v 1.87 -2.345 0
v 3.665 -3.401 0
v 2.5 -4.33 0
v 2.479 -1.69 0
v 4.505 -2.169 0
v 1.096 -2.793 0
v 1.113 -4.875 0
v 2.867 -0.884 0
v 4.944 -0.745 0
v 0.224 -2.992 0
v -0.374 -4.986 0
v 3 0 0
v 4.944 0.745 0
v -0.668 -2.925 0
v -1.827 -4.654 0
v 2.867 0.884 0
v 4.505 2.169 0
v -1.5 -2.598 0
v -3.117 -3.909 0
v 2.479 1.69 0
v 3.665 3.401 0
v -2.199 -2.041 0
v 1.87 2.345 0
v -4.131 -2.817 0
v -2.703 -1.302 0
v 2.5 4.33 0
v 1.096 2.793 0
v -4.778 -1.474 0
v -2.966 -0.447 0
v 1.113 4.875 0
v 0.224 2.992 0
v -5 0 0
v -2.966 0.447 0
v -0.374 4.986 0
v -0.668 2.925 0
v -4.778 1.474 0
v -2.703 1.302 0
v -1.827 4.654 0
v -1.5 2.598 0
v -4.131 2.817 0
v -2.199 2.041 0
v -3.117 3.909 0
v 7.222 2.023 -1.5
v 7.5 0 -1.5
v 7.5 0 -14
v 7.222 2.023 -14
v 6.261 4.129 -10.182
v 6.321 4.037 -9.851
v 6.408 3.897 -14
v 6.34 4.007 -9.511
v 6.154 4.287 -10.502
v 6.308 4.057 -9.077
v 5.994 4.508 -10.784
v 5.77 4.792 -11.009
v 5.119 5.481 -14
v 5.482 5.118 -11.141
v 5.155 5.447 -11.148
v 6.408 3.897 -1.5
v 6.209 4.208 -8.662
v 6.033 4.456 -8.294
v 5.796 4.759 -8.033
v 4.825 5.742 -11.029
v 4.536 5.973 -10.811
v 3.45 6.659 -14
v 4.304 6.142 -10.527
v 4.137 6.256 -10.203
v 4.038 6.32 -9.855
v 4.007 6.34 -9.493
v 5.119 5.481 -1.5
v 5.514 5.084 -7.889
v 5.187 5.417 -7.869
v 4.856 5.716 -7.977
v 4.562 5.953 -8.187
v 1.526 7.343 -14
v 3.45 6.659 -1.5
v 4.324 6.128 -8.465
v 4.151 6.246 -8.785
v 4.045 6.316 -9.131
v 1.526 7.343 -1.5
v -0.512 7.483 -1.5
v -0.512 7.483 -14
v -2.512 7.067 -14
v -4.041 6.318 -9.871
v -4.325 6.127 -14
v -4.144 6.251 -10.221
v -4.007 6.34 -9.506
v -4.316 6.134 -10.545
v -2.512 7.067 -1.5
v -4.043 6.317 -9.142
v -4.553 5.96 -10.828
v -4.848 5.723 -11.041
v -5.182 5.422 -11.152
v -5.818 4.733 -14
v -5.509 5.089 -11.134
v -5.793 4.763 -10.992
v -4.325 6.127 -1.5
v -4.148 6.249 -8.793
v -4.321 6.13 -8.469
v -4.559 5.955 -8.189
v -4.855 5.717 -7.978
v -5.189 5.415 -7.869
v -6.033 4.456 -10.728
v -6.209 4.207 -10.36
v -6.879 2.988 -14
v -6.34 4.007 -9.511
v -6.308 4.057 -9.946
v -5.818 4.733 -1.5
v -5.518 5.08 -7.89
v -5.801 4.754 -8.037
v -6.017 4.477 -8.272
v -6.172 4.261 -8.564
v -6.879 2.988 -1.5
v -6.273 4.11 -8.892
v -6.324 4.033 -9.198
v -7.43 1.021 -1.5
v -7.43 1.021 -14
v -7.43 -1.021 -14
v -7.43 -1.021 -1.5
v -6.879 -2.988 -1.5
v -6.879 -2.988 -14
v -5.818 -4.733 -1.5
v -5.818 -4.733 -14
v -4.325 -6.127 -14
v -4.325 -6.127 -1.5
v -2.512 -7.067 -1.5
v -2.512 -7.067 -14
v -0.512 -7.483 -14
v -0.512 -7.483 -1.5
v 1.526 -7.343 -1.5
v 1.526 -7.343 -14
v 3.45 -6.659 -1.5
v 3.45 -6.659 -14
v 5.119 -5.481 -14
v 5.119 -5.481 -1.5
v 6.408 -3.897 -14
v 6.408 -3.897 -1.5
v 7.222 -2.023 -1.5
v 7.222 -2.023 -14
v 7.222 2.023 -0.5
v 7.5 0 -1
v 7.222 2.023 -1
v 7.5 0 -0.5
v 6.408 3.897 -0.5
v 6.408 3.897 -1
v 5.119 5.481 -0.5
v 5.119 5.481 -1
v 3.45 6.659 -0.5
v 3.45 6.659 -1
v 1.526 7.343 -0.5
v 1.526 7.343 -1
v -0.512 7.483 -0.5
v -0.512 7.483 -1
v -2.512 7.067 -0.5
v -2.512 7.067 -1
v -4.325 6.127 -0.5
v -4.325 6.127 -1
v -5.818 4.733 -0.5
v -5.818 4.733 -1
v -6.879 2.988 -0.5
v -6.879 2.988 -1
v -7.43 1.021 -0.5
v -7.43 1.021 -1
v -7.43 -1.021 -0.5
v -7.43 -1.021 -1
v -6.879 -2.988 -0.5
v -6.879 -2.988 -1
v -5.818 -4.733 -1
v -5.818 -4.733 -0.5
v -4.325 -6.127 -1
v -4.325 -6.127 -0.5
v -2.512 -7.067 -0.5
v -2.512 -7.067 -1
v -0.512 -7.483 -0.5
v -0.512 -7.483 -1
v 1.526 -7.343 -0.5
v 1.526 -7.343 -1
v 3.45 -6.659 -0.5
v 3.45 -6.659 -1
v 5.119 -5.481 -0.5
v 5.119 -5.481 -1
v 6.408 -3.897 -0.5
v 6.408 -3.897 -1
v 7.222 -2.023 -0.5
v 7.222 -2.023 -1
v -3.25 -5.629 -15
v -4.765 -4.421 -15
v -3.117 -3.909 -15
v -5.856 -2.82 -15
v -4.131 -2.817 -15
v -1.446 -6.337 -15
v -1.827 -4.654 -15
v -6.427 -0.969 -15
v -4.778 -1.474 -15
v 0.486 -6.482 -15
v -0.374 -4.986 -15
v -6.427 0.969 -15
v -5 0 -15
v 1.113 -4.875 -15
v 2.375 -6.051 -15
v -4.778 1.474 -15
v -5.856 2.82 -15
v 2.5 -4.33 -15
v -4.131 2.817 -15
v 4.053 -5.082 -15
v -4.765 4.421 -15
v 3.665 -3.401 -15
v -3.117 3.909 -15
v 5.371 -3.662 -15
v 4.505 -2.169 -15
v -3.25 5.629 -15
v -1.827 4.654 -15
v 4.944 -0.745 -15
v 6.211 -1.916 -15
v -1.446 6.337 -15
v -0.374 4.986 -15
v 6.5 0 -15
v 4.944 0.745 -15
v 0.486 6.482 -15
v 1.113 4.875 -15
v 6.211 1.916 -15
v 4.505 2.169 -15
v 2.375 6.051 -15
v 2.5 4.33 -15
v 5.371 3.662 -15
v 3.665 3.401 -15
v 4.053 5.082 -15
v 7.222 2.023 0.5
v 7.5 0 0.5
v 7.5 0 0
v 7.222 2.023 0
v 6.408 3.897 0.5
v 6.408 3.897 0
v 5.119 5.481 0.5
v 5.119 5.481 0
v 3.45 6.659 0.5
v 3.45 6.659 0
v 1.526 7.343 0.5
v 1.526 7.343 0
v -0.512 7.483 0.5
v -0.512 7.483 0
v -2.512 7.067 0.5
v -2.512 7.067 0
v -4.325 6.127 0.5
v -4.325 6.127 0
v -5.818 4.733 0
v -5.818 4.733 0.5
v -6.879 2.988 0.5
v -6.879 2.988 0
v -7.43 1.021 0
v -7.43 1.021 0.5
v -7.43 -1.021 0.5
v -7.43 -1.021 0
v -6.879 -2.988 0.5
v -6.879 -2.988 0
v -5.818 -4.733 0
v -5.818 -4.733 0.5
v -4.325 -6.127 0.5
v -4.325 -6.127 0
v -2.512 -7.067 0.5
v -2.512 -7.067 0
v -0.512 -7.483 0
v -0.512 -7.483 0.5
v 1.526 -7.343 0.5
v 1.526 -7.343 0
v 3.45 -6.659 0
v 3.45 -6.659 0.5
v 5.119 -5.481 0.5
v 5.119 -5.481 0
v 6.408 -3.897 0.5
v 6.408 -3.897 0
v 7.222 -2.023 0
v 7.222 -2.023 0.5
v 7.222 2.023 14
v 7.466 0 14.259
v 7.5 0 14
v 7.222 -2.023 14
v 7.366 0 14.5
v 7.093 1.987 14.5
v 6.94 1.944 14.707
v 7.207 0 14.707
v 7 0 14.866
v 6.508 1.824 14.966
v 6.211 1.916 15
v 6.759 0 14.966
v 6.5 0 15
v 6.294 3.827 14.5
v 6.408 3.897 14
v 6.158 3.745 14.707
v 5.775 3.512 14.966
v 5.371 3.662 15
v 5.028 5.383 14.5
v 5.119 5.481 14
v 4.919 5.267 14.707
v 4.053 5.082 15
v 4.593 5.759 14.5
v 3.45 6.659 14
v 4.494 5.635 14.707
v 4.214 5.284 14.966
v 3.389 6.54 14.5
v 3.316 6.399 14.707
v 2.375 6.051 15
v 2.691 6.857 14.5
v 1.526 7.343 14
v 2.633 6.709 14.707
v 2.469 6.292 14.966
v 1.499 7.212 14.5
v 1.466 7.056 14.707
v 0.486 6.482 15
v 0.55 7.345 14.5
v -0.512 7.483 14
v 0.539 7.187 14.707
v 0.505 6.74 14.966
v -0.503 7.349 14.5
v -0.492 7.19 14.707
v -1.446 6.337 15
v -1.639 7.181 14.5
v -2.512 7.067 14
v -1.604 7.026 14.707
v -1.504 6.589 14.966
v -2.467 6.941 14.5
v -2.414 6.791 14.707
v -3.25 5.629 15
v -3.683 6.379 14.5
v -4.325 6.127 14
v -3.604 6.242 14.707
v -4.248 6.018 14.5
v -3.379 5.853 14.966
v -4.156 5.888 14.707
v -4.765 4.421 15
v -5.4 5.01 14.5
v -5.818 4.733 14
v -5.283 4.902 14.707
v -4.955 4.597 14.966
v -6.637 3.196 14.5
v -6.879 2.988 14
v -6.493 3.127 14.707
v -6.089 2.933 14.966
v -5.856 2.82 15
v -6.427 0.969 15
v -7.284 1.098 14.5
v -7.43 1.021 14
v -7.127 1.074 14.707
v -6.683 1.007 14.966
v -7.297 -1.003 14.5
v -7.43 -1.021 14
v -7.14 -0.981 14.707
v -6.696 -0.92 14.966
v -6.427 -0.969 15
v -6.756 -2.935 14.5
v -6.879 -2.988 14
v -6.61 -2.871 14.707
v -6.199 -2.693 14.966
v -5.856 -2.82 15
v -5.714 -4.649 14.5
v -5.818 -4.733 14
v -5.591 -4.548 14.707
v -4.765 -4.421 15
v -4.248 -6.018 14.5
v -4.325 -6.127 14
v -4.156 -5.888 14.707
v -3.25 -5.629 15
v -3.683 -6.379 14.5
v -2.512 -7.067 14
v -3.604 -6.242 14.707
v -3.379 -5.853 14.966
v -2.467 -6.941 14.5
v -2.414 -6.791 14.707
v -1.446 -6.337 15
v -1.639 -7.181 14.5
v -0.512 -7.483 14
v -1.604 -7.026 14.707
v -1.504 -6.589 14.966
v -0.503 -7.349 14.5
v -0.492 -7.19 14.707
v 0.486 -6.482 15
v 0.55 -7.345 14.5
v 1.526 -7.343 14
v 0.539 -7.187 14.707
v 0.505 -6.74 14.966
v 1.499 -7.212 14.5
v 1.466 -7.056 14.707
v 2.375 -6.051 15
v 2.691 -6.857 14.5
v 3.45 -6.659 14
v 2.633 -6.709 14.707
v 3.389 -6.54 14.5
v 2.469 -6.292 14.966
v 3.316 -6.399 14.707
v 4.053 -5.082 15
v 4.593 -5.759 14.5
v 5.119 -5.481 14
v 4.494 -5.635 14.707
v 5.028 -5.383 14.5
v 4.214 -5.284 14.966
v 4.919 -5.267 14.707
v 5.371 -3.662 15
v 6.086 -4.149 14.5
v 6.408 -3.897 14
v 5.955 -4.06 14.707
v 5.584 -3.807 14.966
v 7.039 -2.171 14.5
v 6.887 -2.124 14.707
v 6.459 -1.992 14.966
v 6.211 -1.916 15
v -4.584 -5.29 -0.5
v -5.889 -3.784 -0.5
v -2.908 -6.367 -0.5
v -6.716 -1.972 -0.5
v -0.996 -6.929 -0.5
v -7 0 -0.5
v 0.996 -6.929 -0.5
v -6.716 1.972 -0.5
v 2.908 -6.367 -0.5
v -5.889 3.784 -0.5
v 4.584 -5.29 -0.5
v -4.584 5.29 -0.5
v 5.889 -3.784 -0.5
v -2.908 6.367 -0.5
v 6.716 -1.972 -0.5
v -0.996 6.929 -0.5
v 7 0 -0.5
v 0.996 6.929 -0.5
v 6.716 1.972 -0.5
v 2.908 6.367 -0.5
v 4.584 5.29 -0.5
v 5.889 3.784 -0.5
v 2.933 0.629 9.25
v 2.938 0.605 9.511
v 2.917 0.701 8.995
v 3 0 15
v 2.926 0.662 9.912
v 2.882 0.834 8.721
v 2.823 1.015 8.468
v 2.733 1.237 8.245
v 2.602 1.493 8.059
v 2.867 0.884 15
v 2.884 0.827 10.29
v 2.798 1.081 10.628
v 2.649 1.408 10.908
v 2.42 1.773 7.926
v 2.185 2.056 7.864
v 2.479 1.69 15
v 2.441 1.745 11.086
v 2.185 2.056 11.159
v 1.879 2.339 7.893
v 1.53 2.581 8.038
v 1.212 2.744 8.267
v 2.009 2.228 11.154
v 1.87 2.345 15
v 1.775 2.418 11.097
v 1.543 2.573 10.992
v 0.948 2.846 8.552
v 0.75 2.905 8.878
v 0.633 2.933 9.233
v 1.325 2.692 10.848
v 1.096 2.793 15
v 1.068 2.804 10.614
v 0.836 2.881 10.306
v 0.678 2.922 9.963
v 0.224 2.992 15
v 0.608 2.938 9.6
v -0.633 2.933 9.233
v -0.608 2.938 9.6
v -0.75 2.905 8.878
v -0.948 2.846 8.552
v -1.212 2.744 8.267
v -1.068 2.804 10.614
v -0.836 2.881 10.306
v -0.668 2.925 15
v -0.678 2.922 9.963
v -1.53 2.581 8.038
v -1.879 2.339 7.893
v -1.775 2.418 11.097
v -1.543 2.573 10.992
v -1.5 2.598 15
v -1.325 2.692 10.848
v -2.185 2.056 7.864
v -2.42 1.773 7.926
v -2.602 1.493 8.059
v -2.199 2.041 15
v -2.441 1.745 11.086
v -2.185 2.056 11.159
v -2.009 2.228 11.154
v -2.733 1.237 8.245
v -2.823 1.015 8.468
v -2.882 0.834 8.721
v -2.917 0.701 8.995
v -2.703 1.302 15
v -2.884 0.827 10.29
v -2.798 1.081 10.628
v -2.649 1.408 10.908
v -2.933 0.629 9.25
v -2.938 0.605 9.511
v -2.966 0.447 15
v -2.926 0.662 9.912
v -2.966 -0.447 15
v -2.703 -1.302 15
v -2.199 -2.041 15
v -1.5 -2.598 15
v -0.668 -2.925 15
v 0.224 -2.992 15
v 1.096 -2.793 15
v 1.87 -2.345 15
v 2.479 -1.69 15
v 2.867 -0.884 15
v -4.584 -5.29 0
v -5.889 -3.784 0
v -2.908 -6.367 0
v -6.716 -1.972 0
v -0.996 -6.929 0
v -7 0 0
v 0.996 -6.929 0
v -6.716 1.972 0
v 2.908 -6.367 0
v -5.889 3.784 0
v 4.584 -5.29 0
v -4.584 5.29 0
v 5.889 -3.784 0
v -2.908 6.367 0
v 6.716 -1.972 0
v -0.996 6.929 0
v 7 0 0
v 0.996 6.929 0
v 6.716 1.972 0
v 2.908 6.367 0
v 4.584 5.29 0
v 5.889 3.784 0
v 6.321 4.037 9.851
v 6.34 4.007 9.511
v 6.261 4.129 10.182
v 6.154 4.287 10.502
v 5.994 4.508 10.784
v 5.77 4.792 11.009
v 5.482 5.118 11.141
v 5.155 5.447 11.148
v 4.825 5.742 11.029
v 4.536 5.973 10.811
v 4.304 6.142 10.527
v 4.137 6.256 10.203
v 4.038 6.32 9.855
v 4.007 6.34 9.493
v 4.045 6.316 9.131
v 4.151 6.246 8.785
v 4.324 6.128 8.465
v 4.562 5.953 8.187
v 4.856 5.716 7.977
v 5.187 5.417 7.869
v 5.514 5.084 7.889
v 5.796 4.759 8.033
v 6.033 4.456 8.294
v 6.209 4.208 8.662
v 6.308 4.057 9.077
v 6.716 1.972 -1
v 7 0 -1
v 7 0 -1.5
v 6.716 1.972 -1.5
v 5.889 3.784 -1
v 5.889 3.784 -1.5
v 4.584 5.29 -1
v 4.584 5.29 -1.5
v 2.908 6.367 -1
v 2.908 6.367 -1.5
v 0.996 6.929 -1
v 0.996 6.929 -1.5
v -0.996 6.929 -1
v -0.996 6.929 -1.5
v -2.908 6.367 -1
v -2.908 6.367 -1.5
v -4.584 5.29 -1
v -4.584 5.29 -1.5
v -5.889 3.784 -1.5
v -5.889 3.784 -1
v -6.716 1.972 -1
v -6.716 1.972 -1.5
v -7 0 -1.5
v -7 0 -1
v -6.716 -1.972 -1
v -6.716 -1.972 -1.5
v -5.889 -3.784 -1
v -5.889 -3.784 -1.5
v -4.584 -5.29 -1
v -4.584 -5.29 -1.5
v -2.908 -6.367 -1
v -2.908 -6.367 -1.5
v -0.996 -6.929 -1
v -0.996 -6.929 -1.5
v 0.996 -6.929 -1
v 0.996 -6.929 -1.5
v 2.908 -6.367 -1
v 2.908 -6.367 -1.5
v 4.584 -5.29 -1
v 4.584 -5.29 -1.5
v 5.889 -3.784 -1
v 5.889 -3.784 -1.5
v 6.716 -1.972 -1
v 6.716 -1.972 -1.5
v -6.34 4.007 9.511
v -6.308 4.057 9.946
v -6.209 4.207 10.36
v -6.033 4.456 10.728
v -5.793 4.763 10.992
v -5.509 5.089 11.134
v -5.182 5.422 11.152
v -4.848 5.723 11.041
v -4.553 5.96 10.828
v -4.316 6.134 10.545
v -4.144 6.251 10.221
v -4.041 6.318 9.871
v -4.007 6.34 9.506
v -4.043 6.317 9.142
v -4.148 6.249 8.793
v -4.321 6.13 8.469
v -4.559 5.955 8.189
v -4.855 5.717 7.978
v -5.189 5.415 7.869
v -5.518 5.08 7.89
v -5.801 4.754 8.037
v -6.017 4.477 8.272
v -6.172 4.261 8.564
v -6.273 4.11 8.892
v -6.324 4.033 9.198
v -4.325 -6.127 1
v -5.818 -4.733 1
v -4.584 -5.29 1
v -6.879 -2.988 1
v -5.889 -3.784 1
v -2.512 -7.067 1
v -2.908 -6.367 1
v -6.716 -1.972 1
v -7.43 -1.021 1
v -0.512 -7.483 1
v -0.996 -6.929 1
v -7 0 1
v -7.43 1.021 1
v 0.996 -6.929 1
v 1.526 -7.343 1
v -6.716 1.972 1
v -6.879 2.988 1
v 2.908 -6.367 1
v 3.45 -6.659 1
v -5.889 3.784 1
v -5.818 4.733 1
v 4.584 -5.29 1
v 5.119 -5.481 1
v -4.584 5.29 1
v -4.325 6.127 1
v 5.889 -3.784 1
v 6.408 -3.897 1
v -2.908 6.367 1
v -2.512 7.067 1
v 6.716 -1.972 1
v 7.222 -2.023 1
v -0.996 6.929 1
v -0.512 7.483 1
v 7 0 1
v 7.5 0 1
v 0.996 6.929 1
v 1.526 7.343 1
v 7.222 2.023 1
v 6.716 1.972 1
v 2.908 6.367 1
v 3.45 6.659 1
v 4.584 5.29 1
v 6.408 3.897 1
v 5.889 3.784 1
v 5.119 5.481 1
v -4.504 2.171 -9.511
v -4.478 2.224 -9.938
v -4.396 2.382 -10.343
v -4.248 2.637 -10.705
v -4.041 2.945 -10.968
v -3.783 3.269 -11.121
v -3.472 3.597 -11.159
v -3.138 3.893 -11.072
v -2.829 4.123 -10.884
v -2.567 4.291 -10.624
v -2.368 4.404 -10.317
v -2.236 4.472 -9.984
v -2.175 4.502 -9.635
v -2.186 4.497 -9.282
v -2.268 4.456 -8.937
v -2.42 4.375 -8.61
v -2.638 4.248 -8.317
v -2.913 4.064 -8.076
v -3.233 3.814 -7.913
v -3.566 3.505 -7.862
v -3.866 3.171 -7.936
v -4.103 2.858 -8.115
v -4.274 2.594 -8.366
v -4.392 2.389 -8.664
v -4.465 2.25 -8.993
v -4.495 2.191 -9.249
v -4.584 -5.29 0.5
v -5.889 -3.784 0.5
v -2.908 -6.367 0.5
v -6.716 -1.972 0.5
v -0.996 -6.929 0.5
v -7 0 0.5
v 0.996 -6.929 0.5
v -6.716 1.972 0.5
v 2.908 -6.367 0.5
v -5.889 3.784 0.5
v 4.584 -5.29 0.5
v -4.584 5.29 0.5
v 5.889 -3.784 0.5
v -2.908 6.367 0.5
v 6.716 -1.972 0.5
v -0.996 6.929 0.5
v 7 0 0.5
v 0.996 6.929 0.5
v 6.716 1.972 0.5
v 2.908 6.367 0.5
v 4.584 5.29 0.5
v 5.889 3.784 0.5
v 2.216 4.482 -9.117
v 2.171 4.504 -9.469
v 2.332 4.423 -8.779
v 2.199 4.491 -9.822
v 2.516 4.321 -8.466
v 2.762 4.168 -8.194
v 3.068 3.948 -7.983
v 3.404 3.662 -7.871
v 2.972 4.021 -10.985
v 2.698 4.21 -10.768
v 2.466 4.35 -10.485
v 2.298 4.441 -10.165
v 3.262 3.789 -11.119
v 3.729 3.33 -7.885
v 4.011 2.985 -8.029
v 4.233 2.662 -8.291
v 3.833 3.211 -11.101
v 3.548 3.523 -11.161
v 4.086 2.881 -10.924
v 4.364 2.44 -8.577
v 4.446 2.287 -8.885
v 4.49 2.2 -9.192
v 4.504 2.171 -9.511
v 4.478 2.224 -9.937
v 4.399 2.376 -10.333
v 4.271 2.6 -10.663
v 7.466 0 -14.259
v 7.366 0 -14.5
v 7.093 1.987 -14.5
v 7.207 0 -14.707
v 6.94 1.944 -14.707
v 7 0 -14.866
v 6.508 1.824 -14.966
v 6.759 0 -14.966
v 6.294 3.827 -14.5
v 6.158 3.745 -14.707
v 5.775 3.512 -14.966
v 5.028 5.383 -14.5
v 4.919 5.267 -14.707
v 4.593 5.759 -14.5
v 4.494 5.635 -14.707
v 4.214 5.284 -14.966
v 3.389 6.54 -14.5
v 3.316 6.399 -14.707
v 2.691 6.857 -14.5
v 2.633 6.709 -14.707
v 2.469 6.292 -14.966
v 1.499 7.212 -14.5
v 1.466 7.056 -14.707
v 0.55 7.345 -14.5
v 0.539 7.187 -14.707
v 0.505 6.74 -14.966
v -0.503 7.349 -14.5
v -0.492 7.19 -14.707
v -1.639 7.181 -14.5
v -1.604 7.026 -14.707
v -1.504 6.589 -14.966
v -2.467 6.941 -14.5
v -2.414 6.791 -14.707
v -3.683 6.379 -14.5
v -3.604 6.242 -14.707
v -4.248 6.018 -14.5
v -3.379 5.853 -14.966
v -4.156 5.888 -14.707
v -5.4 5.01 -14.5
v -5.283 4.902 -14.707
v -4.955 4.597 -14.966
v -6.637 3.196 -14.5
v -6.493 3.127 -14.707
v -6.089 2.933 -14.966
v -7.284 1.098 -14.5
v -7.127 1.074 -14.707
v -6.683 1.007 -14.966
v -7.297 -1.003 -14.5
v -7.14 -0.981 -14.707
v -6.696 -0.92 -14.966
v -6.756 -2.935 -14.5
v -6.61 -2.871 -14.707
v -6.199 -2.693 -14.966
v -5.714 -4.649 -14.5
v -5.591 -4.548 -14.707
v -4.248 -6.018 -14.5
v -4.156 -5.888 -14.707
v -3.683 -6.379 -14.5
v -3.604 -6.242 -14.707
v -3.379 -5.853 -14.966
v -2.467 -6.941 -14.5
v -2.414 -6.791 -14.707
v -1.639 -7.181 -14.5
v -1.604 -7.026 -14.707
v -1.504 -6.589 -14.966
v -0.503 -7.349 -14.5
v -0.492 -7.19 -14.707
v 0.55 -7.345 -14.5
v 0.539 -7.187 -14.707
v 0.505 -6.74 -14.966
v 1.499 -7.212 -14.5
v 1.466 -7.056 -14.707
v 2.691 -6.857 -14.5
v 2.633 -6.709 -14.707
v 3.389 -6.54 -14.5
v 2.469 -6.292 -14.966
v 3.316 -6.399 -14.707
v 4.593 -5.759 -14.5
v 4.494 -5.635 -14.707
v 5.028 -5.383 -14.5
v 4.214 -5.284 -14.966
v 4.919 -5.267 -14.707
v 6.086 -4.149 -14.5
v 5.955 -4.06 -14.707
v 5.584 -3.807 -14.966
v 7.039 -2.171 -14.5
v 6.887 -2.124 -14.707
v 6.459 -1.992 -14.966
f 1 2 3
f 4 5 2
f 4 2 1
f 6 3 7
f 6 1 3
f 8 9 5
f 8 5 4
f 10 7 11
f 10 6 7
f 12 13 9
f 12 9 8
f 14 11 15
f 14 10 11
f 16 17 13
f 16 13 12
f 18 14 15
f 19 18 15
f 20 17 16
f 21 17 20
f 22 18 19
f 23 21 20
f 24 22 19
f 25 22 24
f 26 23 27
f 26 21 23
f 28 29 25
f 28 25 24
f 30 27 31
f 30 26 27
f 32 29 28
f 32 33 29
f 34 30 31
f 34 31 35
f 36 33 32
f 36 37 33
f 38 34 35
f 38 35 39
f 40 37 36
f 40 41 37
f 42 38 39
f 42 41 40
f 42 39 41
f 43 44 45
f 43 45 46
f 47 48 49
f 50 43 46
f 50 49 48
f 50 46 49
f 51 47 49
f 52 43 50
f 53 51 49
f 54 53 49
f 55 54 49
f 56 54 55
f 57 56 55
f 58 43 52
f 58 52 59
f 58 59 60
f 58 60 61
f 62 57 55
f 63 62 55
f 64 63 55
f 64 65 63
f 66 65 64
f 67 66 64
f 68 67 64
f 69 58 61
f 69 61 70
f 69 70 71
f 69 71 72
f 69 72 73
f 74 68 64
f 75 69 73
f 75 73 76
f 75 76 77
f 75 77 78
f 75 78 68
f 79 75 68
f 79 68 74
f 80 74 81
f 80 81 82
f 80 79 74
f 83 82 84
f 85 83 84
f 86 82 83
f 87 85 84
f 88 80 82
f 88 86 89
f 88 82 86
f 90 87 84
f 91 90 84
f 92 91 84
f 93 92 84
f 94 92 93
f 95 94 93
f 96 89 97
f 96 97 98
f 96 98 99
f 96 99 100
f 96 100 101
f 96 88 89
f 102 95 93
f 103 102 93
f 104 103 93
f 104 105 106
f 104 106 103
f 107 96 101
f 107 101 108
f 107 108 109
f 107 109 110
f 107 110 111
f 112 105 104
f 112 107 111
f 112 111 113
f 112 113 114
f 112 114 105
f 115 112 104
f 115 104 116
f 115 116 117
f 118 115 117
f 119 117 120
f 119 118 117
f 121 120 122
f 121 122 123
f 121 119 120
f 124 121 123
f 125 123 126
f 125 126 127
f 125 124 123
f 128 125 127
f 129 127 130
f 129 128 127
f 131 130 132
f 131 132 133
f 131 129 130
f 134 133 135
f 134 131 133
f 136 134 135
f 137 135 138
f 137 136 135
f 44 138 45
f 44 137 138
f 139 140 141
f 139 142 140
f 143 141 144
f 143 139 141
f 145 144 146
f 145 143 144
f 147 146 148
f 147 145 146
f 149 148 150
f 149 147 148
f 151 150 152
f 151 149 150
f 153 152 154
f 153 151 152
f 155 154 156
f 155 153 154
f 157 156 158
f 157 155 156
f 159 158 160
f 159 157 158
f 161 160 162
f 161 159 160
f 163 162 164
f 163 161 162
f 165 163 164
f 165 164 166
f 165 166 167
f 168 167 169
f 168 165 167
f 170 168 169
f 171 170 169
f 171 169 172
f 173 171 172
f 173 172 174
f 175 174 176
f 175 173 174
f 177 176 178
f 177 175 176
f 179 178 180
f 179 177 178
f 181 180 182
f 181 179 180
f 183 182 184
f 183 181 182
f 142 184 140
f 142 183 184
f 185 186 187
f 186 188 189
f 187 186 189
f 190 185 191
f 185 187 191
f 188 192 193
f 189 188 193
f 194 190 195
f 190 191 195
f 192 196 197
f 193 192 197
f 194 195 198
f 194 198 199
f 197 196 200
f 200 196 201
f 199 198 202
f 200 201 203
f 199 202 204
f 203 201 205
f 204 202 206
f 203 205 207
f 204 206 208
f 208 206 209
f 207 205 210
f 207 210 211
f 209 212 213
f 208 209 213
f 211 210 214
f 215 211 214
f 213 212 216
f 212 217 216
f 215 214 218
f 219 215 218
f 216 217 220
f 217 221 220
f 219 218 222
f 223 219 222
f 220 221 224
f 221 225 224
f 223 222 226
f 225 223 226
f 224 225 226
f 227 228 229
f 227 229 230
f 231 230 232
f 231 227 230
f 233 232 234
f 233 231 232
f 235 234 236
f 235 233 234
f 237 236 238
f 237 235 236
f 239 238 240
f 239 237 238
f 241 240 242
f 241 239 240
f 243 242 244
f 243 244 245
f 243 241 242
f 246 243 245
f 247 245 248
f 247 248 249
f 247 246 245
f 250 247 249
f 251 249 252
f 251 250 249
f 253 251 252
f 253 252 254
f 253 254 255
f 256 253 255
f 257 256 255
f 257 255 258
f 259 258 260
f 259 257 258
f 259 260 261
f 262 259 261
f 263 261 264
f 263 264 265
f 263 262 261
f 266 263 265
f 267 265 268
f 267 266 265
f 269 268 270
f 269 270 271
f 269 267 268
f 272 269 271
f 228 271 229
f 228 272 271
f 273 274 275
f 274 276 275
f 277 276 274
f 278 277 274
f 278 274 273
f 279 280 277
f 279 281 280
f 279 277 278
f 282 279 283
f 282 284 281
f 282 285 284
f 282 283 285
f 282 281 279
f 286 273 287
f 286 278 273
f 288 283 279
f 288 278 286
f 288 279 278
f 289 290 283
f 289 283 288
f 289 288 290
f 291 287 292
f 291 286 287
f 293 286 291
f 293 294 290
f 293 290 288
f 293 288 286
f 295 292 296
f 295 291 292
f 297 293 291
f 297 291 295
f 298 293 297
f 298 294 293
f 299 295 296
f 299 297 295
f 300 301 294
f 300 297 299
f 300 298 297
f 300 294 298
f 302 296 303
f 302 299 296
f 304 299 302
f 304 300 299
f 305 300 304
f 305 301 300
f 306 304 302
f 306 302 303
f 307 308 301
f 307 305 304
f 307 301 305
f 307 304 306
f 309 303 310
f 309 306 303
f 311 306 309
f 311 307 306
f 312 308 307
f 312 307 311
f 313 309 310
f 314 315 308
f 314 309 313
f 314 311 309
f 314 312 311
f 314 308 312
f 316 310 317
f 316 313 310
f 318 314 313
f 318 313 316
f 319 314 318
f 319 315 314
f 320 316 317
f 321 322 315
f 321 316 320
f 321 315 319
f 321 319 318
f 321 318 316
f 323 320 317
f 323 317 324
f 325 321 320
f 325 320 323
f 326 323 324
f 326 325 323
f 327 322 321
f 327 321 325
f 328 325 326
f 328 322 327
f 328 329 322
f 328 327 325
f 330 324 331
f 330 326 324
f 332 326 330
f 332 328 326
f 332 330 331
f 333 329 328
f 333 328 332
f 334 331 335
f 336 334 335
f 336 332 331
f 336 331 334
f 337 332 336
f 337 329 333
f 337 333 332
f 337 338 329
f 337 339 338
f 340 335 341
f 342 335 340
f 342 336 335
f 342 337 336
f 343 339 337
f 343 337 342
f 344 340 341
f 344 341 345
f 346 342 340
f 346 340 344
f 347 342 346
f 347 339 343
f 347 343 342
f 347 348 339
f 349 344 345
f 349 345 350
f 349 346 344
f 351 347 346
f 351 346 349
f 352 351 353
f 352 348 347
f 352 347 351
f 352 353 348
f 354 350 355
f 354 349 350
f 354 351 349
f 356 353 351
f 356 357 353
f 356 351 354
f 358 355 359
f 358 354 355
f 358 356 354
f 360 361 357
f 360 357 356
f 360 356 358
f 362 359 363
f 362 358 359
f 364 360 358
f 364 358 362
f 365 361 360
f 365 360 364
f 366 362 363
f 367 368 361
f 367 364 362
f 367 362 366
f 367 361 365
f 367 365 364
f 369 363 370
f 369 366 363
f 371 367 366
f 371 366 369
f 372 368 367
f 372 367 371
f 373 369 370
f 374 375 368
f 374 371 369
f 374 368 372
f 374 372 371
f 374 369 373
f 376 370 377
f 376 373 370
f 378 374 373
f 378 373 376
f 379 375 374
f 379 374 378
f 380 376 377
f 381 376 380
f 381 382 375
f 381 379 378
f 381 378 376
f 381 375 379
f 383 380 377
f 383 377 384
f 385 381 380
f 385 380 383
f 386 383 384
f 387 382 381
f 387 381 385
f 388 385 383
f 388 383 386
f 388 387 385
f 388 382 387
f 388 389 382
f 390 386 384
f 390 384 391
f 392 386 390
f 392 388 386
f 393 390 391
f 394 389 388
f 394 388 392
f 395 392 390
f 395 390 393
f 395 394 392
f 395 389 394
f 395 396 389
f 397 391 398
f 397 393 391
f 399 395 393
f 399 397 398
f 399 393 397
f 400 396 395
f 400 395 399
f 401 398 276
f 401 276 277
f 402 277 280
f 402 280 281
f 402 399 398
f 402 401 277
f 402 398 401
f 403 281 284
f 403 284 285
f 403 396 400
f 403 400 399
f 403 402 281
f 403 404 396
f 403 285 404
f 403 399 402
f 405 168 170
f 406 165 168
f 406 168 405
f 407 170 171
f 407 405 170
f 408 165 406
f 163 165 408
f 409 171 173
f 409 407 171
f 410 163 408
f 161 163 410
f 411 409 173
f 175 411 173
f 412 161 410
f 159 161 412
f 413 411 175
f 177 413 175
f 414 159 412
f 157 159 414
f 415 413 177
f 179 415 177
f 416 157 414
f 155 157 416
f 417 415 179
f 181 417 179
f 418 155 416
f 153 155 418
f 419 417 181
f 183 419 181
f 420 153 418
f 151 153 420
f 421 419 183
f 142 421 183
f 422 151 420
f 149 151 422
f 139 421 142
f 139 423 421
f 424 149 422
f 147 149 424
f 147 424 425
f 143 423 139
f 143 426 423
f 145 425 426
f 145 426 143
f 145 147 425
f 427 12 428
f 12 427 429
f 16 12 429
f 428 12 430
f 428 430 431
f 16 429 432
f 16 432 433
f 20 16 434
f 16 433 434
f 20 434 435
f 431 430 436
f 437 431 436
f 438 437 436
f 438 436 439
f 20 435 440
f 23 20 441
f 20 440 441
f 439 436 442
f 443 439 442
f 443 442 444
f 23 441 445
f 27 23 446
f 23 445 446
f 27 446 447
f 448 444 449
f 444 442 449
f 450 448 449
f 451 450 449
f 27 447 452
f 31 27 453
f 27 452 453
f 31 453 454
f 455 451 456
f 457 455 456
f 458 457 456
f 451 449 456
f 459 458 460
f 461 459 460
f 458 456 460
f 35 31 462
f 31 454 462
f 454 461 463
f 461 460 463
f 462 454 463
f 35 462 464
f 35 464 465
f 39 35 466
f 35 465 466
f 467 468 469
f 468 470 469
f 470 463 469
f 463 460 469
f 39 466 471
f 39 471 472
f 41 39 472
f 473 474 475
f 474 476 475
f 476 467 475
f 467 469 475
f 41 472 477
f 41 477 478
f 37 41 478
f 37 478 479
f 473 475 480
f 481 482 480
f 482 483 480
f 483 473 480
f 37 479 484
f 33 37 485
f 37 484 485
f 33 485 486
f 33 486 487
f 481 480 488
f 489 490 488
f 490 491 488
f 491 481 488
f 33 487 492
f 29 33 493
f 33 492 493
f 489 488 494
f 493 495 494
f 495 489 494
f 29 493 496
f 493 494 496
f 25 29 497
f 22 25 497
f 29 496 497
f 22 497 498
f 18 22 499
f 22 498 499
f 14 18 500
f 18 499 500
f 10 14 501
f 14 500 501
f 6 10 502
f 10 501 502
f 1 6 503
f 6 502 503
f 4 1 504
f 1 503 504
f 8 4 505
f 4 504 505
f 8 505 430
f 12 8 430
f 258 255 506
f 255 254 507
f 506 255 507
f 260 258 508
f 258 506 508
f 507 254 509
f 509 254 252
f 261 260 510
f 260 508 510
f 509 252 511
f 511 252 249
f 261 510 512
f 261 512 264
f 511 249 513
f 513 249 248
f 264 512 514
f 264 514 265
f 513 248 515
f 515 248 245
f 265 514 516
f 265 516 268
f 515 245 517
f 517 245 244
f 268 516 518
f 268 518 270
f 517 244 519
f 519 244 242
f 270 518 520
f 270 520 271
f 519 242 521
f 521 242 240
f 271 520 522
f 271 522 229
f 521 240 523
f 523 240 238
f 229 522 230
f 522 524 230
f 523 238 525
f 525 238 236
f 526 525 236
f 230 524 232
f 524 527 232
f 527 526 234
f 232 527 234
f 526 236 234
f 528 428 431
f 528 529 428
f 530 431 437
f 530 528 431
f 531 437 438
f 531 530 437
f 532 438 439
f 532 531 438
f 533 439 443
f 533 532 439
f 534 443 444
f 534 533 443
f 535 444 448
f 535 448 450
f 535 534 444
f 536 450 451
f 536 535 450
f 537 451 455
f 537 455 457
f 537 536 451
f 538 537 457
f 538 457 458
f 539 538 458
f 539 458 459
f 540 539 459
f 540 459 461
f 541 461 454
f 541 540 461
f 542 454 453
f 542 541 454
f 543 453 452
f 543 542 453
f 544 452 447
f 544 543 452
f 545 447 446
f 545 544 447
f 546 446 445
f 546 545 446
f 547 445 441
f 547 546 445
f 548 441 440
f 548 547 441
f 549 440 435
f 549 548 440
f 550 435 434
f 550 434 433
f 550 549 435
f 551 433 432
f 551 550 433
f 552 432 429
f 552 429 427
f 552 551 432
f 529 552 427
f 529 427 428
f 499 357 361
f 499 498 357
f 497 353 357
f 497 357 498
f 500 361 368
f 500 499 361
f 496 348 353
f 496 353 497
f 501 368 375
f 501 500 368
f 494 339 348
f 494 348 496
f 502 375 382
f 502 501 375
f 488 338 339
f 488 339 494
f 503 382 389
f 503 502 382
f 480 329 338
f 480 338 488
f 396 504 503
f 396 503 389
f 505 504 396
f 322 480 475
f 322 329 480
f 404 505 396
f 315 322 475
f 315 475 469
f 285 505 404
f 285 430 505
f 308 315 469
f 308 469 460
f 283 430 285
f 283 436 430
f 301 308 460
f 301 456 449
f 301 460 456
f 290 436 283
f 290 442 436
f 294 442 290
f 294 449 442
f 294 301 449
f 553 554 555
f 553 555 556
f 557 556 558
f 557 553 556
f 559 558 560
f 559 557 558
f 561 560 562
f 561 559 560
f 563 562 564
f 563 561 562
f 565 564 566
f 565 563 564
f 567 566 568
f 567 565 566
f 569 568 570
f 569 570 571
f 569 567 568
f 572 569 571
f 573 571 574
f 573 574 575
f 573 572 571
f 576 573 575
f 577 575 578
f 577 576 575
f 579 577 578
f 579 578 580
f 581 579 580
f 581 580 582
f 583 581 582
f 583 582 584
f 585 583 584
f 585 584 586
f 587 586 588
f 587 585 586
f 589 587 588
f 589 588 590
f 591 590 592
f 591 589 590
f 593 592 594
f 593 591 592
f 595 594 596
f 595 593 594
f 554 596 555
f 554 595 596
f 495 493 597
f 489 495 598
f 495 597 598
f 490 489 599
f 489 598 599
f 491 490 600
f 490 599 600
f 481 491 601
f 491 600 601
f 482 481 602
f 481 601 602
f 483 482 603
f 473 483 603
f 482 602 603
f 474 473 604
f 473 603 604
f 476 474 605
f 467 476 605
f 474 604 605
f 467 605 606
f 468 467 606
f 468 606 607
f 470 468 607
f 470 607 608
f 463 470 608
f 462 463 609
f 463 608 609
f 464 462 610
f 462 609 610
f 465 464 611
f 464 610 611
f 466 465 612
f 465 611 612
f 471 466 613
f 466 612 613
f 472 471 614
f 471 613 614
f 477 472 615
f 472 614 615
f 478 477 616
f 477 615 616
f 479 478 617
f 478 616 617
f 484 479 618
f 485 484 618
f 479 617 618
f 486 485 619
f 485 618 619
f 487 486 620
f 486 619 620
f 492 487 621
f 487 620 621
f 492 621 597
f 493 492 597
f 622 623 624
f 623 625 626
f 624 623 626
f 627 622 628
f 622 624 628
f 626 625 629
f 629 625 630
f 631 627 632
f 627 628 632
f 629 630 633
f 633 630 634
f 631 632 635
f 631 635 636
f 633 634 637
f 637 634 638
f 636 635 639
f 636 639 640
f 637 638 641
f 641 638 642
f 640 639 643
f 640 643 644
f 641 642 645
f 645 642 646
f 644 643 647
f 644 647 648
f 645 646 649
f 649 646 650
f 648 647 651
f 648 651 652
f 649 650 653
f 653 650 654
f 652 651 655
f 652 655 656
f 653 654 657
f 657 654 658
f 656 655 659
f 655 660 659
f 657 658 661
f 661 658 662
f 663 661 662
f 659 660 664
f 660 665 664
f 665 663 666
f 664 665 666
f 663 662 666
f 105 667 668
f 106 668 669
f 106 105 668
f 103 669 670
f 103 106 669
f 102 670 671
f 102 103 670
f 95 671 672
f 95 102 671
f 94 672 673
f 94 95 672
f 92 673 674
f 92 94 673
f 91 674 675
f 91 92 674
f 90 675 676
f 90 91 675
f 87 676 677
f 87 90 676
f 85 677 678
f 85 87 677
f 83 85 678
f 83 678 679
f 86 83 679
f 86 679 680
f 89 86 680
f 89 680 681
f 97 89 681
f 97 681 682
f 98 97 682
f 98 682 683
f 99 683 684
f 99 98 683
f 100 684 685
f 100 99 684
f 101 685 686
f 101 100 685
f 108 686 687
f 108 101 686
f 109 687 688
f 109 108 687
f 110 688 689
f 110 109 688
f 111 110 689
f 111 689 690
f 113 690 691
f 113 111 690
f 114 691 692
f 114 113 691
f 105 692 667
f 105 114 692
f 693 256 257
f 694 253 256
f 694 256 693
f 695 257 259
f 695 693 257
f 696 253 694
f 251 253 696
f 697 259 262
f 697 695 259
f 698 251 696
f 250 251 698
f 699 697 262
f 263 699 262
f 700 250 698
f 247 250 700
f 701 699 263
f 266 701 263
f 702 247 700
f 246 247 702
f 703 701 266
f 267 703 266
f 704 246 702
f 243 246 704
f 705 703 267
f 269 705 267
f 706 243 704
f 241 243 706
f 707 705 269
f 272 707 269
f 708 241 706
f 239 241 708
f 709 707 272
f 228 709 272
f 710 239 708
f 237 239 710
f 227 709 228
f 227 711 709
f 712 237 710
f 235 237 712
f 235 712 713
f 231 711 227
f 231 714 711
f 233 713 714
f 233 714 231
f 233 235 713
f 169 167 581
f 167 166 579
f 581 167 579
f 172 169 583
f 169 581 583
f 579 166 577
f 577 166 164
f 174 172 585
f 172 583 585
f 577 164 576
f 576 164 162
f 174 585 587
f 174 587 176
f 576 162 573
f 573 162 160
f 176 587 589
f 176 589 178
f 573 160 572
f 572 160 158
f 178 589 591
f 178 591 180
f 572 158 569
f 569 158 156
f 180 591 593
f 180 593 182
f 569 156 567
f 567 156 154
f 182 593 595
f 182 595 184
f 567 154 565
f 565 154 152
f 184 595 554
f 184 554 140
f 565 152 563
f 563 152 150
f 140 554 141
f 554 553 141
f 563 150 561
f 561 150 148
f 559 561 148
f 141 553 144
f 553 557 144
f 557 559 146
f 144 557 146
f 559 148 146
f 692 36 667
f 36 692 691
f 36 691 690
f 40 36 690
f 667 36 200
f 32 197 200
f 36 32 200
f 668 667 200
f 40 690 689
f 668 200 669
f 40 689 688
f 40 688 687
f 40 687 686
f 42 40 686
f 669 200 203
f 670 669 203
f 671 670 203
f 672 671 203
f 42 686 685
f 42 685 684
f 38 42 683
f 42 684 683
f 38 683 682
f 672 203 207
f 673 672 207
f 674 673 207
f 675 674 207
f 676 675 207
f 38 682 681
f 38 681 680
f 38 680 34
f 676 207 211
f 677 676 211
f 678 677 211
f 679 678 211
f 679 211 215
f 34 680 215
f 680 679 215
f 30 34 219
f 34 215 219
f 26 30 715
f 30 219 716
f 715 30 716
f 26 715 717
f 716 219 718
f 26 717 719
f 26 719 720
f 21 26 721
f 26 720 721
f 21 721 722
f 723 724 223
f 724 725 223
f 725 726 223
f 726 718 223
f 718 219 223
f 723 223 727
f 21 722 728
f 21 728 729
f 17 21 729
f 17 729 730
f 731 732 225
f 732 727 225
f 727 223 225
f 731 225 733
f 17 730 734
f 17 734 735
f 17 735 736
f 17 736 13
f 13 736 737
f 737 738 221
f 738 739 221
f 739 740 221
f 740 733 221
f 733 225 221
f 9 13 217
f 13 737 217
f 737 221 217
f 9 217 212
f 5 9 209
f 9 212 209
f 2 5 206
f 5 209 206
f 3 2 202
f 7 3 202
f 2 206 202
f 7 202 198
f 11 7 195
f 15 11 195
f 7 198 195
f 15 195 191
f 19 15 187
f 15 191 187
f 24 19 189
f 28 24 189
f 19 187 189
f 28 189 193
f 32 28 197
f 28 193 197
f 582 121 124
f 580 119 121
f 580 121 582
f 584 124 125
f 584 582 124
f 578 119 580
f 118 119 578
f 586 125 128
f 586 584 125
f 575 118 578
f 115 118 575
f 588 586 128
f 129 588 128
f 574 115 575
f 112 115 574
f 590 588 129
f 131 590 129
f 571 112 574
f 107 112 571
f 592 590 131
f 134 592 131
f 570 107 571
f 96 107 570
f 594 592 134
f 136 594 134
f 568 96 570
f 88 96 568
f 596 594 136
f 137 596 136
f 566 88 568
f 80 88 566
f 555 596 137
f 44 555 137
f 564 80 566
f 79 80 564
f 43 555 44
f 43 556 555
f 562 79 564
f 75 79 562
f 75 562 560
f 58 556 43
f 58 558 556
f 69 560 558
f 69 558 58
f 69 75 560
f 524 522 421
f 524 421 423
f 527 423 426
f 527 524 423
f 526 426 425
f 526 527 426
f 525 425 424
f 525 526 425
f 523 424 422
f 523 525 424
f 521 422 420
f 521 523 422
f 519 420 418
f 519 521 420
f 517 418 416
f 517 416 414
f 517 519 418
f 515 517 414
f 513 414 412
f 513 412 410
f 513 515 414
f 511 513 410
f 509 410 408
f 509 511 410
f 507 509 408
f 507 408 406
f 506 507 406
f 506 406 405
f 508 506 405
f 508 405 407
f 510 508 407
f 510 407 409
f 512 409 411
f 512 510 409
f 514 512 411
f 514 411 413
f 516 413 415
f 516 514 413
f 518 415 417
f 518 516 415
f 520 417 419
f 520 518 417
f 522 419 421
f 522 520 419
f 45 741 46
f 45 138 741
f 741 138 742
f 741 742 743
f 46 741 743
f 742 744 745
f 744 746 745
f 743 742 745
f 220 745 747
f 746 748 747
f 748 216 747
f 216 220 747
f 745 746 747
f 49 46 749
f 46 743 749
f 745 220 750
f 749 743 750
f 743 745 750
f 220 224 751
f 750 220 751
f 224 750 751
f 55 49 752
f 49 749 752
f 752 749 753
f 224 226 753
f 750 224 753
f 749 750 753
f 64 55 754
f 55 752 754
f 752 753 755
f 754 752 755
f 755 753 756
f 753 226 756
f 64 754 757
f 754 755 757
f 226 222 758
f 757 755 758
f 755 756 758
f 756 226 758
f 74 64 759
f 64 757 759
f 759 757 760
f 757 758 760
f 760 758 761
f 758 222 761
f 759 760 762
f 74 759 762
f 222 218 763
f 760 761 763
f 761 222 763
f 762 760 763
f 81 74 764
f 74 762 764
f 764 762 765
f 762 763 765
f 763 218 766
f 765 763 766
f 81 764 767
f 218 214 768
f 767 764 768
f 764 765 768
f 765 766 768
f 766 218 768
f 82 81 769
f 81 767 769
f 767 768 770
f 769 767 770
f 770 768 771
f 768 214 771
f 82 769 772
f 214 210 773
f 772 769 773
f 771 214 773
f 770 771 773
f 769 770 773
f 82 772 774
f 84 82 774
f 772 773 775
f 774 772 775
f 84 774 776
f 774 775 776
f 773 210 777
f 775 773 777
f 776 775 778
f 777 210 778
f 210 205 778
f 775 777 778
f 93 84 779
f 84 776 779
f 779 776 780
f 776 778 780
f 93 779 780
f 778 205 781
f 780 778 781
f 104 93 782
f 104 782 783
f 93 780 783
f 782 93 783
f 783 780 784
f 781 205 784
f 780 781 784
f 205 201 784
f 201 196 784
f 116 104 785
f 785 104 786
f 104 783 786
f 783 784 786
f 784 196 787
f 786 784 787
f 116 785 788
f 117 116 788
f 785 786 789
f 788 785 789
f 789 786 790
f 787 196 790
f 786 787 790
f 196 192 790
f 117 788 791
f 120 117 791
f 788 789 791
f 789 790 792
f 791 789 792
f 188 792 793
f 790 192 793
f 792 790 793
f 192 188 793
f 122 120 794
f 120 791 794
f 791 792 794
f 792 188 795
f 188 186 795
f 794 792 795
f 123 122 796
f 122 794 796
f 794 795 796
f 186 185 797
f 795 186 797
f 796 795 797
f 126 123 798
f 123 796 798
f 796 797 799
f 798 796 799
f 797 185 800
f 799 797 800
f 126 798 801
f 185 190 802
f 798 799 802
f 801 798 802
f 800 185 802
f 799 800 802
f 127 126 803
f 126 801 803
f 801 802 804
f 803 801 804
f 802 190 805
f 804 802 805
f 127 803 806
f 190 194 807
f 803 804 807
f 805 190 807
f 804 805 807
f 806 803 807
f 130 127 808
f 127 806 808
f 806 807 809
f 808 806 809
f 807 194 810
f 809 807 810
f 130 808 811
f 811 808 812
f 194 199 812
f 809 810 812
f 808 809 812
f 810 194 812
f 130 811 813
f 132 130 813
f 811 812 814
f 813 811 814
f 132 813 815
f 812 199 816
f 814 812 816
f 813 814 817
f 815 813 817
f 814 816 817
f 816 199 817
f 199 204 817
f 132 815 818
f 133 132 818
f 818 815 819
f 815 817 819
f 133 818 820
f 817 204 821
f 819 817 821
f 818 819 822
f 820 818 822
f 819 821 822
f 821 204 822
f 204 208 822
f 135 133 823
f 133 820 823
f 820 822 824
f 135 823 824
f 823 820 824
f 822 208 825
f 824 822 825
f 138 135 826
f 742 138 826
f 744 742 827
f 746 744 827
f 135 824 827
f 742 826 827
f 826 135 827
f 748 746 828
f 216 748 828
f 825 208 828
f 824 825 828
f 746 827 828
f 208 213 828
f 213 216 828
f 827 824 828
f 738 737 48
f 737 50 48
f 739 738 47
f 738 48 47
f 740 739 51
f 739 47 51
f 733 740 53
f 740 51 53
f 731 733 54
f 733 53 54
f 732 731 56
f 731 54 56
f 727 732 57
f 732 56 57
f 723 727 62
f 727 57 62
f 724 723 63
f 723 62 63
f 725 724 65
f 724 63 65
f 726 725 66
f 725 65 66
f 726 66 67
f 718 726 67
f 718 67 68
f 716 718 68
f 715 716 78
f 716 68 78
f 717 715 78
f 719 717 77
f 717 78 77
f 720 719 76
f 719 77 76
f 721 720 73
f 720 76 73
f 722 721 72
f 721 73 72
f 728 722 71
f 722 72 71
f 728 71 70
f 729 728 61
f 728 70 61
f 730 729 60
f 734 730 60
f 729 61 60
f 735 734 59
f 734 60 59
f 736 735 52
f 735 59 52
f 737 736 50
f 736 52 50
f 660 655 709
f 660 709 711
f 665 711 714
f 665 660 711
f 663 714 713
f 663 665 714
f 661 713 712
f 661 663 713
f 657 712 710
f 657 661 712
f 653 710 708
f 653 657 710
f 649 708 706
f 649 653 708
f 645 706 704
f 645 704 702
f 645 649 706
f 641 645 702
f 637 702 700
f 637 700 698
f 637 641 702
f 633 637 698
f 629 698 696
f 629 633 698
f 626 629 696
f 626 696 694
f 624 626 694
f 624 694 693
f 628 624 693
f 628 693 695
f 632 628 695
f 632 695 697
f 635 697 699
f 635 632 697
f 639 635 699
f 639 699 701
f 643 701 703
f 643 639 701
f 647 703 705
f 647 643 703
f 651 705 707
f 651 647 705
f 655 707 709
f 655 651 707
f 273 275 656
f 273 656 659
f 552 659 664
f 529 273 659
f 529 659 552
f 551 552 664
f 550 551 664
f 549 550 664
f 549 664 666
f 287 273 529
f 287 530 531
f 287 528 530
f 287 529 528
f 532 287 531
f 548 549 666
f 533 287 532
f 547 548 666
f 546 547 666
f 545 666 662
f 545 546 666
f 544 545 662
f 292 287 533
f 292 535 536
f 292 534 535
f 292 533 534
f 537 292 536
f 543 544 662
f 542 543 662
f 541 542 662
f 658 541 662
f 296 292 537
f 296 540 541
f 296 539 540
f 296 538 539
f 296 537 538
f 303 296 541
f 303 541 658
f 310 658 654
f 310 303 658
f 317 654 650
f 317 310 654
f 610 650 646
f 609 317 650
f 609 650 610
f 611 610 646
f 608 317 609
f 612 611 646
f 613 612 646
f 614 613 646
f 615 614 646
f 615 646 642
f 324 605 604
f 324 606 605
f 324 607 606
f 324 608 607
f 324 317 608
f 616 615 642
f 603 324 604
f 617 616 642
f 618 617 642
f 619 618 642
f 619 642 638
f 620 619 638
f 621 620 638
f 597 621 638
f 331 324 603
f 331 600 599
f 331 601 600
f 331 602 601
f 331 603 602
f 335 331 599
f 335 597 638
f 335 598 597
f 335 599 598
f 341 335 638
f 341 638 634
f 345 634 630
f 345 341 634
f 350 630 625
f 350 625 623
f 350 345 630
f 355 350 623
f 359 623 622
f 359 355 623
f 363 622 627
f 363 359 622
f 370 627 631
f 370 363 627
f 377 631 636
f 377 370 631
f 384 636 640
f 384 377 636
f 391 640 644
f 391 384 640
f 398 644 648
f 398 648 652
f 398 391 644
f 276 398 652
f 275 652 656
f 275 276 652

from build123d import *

# Parameters (mm, degrees)
SKETCH2_R           = 7.5
BOSS_EXTRUDE1_DEPTH = 15
SKETCH3_R           = 3
CUT_EXTRUDE1_DEPTH  = 15
SKETCH4_R           = 5
CUT_EXTRUDE2_DEPTH  = 15
SKETCH5_R           = 7.5
SKETCH5_R_2         = 7
CUT_EXTRUDE3_DEPTH  = 0.5
LPATTERN1_COUNT     = 2
LPATTERN1_PITCH     = 1
LPATTERN2_COUNT     = 2
LPATTERN2_PITCH     = 1
FILLET1_R           = 1


with BuildPart() as part:
    # Sketch2 → Boss-Extrude1 (new, symmetric)
    with BuildSketch(Plane.XY):
        Circle(SKETCH2_R)
    extrude(amount=BOSS_EXTRUDE1_DEPTH, both=True)

    # Sketch3 → Cut-Extrude1 (cut)
    with BuildSketch(Plane.XY.offset(15)):
        Circle(SKETCH3_R)
    extrude(amount=-CUT_EXTRUDE1_DEPTH, mode=Mode.SUBTRACT)

    # Sketch4 → Cut-Extrude2 (cut)
    with BuildSketch(Plane(origin=(0, 0, -15), x_dir=(-1, 0, 0), z_dir=(0, 0, -1))):
        Circle(SKETCH4_R)
    extrude(amount=-CUT_EXTRUDE2_DEPTH, mode=Mode.SUBTRACT)

    # Sketch5 → Cut-Extrude3 (cut)
    with BuildSketch(Plane.XY):
        Circle(SKETCH5_R)
        Circle(SKETCH5_R_2, mode=Mode.SUBTRACT)
    cut_extrude3 = extrude(amount=-CUT_EXTRUDE3_DEPTH, mode=Mode.SUBTRACT)

    # LPattern1: Cut-Extrude3 ×2
    with Locations(*[(0, 0, -i * LPATTERN1_PITCH) for i in range(1, LPATTERN1_COUNT)]):
        add(cut_extrude3, mode=Mode.SUBTRACT)

    # LPattern2: Cut-Extrude3 ×2
    with Locations(*[(0, 0, i * LPATTERN2_PITCH) for i in range(1, LPATTERN2_COUNT)]):
        add(cut_extrude3, mode=Mode.SUBTRACT)

    # Sketch9 → M4 Tapped Hole1 (revolve, cut)
    with BuildSketch(Plane(origin=(-5.303300859, 5.303300859, -9.511136026), x_dir=(-0.7071067811865488, -0.7071067811865464, 0), z_dir=(0, 0, 1))):
        Polygon((0, 0), (0, 6.991420021), (1.65, 6), (1.65, 0), align=None)
    m4_tapped_hole1 = revolve(axis=Axis((-9.793428919, 9.793428919, -9.511136026), (0.7071067811865465, -0.7071067811865487, 0)), mode=Mode.SUBTRACT)

    # Mirror1: M4 Tapped Hole1 across plane
    add(m4_tapped_hole1.mirror(Plane(origin=(0, 0, 0), x_dir=(0, 0, 1), z_dir=(1, 0, 0))), mode=Mode.SUBTRACT)

    # Mirror2: M4 Tapped Hole1 across plane
    add(m4_tapped_hole1.mirror(Plane.XY), mode=Mode.SUBTRACT)

    # Mirror2 copy 1 sketch → Mirror2 copy 1 (revolve, cut)
    with BuildSketch(Plane(origin=(5.303300859, 5.303300859, 9.511136026), x_dir=(0.7071067811865488, -0.7071067811865464, 0), z_dir=(0, 0, -1))):
        Polygon((0, 0), (0, 6.991420021), (1.65, 6), (1.65, 0), align=None)
    revolve(axis=Axis((9.793428919, 9.793428919, 9.511136026), (-0.7071067811865465, -0.7071067811865487, 0)), mode=Mode.SUBTRACT)

    # Fillet1
    fillet1_edges = [part.edges().sort_by_distance(p)[0] for p in [
        (-7.5, 0, -15),
        (-7.5, 0, 15),
    ]]
    fillet(fillet1_edges, radius=FILLET1_R)


solid = part.part
